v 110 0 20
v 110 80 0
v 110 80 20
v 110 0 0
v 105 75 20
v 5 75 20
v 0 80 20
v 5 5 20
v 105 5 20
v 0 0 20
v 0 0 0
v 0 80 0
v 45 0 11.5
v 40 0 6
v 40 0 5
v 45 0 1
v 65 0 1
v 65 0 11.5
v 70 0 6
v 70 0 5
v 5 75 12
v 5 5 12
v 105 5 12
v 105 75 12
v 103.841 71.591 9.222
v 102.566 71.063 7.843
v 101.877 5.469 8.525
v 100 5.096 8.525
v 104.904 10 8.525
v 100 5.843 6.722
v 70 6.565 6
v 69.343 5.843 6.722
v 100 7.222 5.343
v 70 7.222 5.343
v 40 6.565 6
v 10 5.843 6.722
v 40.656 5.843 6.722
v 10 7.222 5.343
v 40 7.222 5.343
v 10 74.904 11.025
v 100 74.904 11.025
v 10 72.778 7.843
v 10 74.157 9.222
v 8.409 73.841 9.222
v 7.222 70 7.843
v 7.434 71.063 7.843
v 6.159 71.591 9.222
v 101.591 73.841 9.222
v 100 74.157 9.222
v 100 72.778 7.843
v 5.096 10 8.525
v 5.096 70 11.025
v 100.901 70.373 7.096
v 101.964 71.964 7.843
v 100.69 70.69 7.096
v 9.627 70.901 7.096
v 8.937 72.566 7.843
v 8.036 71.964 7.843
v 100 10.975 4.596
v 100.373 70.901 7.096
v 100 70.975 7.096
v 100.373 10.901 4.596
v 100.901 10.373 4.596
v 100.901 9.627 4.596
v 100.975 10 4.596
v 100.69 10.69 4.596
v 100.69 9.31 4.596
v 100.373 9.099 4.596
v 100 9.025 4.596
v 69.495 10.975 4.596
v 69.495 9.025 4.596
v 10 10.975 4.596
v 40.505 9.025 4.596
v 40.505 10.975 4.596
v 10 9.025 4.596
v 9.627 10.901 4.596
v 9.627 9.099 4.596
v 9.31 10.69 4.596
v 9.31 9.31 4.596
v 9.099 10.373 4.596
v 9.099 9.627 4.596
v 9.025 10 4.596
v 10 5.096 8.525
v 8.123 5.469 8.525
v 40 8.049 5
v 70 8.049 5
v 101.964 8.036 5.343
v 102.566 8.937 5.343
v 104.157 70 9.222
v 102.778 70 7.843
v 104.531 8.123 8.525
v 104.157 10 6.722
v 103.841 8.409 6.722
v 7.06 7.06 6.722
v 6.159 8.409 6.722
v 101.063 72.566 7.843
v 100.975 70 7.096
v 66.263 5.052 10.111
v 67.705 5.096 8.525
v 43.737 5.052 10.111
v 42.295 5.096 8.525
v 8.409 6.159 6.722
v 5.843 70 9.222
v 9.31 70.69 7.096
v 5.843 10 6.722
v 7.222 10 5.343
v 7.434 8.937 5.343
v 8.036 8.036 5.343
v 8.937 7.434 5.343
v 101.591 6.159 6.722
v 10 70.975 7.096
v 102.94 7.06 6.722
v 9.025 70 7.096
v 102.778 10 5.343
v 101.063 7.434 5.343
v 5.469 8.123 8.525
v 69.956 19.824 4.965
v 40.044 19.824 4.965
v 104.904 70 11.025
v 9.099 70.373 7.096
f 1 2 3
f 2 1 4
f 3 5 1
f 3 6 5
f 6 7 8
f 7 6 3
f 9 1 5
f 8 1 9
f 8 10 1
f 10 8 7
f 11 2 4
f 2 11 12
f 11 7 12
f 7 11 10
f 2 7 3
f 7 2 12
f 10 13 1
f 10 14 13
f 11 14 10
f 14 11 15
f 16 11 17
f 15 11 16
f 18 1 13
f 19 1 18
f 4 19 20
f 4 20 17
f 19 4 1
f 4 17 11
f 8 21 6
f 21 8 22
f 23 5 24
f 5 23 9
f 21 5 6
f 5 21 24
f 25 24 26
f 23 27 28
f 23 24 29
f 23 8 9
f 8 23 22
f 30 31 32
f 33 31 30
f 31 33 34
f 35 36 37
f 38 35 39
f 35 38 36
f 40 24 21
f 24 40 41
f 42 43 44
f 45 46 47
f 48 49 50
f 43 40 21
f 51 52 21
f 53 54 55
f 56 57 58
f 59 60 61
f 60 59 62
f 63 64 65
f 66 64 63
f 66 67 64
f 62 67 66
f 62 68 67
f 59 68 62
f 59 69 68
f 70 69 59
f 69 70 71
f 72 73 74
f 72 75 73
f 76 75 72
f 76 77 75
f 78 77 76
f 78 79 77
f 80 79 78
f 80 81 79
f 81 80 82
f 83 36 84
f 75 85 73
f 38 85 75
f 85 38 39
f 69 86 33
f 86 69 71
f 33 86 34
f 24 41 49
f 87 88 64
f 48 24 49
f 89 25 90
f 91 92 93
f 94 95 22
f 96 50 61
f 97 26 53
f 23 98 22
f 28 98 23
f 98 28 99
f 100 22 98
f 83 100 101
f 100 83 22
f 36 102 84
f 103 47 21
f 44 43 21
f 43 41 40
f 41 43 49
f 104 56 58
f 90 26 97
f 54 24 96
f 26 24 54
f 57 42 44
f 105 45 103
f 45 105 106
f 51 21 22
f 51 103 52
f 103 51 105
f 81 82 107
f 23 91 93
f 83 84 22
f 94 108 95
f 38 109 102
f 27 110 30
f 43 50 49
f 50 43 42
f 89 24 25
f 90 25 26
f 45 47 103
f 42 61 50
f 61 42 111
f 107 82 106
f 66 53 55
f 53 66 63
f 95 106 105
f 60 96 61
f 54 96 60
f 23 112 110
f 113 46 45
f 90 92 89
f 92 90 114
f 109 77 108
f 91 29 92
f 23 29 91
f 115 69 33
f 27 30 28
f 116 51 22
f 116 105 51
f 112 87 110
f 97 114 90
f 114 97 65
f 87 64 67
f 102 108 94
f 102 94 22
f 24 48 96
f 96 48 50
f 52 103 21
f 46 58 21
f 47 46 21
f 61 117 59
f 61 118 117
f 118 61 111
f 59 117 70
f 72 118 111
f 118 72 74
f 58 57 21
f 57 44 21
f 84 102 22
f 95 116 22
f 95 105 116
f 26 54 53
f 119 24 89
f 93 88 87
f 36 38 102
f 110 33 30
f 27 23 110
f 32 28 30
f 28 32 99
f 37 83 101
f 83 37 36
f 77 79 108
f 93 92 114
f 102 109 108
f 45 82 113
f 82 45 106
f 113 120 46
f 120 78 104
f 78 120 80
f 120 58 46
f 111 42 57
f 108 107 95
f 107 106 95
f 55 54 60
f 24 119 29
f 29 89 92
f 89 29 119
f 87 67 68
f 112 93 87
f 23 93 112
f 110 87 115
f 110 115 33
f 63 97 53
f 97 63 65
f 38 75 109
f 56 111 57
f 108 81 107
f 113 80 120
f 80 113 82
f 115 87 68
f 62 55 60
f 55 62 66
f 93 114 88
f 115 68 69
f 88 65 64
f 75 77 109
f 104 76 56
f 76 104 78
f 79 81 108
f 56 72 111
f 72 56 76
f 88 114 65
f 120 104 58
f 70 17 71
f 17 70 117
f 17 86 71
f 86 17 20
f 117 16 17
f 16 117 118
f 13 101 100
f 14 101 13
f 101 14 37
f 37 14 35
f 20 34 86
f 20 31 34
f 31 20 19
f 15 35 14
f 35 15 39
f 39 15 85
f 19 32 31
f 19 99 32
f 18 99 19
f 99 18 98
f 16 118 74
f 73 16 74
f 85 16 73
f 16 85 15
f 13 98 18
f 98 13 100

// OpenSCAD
difference() {
    cube([110,80,20]);

    
    translate([5,5,12])
    hull(){
        cube([120-20,90-20,20]);

        
        translate([1,1,-.5]*5) sphere(r=5);
        translate([(120-20-5)/5,1,-.5]*5) sphere(r=5);

        translate([1,(90-20-5)/5,0]*5) sphere(r=5);
        translate([(120-20-5)/5,(90-20-5)/5,0]*5) sphere(r=5);
    }


    translate([120-40,0,10]/2)
    hull() {
        cube([30,20,1]);

        translate([10,-40,-8])
        cube([10,20,20]);
    }
}
